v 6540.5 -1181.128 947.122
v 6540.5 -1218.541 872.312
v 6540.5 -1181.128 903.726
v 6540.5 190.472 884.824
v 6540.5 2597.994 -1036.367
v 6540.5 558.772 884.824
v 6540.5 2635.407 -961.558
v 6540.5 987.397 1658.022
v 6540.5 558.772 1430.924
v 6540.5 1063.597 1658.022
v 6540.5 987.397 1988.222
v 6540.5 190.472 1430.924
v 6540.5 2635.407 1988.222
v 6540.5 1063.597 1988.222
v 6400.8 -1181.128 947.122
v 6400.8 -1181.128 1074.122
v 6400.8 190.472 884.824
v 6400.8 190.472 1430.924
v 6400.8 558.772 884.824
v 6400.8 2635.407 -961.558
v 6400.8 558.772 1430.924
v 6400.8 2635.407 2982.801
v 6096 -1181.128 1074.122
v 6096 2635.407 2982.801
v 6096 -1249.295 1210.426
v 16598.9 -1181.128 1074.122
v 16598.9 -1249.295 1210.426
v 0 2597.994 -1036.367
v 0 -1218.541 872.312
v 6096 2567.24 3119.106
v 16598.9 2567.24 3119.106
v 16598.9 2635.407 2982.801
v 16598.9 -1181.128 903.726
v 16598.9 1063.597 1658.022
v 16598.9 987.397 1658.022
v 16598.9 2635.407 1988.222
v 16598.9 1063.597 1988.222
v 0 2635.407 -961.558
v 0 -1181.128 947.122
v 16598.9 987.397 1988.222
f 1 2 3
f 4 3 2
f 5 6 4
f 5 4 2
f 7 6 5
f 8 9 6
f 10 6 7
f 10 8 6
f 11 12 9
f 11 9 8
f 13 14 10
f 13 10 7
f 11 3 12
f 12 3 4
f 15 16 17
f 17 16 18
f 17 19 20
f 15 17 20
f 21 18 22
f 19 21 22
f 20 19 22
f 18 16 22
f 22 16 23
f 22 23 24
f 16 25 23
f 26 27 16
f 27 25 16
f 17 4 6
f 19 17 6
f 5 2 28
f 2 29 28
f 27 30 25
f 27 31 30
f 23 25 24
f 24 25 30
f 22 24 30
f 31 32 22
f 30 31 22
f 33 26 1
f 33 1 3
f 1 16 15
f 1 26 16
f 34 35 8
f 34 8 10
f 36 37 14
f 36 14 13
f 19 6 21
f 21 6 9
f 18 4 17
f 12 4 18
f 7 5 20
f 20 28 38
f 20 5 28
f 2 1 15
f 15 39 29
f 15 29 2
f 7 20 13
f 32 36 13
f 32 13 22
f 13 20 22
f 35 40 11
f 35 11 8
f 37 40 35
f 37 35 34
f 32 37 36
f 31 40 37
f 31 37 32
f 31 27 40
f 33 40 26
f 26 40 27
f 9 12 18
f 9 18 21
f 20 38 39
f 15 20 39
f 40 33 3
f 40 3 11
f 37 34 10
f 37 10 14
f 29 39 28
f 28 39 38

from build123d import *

# Parameters (mm, degrees)
F1_DEPTH      = 6400.8
F3_DEPTH      = 139.7
F5_DEPTH      = 10058.4
F5_DEPTH_BACK = 444.5
F8_DEPTH      = 10058.4
F7_W          = 368.3
F7_H          = 546.1
F9_DEPTH      = 6540.501
F11_DEPTH     = 10058.4


with BuildPart() as f1:
    # F0 (on Right) → F1 (new body)
    with BuildSketch(Plane.YZ):
        Polygon((-1181.128004, 947.121533), (-1218.540741, 872.312214), (2597.994124, -1036.367294), (2635.406861, -961.557975), align=None)
    extrude(amount=F1_DEPTH)

    # F2 (on face) → F3 (join)
    with BuildSketch(Plane.YZ.offset(6400.8)):
        Polygon((-1181.128004, 1074.121533), (-1181.128004, 947.121533), (-1218.540741, 872.312214), (2597.994124, -1036.367294), (2635.406861, -961.557975), (2635.406861, 2982.801042), align=None)
    extrude(amount=F3_DEPTH)

    # F4 (on face) → F5 (join, two sides)
    with BuildSketch(Plane.YZ.offset(6540.5)) as f5_sk:
        Polygon((-1249.295129, 1210.42635), (-1181.128004, 1074.121533), (2635.406861, 2982.801042), (2567.239736, 3119.105858), align=None)
    extrude(amount=F5_DEPTH)
    extrude(f5_sk.sketch, amount=-F5_DEPTH_BACK)

    # F6 (on face) → F8 (join)
    with BuildSketch(Plane.YZ.offset(6540.5)):
        Polygon((2635.406861, 2982.801042), (-1181.128004, 1074.121533), (-1181.128004, 903.725794), (2635.406861, 2812.405302), align=None)
    extrude(amount=F8_DEPTH)

    # F7 (on face) → F9 (cut, through all)
    with BuildSketch(Plane.YZ.offset(6540.5)):
        with Locations((374.621996, 1157.873887)):
            Rectangle(F7_W, F7_H)
    extrude(amount=-F9_DEPTH, mode=Mode.SUBTRACT)

    # F10 (on face) → F11 (join)
    with BuildSketch(Plane.YZ.offset(6540.5)):
        Polygon((987.396996, 1988.222432), (987.396996, 1658.022432), (1063.596996, 1658.022432), (1063.596996, 1988.222432), (2635.406861, 1988.222432), (2635.406861, 2812.405302), align=None)
    extrude(amount=F11_DEPTH)


solid = f1.part
